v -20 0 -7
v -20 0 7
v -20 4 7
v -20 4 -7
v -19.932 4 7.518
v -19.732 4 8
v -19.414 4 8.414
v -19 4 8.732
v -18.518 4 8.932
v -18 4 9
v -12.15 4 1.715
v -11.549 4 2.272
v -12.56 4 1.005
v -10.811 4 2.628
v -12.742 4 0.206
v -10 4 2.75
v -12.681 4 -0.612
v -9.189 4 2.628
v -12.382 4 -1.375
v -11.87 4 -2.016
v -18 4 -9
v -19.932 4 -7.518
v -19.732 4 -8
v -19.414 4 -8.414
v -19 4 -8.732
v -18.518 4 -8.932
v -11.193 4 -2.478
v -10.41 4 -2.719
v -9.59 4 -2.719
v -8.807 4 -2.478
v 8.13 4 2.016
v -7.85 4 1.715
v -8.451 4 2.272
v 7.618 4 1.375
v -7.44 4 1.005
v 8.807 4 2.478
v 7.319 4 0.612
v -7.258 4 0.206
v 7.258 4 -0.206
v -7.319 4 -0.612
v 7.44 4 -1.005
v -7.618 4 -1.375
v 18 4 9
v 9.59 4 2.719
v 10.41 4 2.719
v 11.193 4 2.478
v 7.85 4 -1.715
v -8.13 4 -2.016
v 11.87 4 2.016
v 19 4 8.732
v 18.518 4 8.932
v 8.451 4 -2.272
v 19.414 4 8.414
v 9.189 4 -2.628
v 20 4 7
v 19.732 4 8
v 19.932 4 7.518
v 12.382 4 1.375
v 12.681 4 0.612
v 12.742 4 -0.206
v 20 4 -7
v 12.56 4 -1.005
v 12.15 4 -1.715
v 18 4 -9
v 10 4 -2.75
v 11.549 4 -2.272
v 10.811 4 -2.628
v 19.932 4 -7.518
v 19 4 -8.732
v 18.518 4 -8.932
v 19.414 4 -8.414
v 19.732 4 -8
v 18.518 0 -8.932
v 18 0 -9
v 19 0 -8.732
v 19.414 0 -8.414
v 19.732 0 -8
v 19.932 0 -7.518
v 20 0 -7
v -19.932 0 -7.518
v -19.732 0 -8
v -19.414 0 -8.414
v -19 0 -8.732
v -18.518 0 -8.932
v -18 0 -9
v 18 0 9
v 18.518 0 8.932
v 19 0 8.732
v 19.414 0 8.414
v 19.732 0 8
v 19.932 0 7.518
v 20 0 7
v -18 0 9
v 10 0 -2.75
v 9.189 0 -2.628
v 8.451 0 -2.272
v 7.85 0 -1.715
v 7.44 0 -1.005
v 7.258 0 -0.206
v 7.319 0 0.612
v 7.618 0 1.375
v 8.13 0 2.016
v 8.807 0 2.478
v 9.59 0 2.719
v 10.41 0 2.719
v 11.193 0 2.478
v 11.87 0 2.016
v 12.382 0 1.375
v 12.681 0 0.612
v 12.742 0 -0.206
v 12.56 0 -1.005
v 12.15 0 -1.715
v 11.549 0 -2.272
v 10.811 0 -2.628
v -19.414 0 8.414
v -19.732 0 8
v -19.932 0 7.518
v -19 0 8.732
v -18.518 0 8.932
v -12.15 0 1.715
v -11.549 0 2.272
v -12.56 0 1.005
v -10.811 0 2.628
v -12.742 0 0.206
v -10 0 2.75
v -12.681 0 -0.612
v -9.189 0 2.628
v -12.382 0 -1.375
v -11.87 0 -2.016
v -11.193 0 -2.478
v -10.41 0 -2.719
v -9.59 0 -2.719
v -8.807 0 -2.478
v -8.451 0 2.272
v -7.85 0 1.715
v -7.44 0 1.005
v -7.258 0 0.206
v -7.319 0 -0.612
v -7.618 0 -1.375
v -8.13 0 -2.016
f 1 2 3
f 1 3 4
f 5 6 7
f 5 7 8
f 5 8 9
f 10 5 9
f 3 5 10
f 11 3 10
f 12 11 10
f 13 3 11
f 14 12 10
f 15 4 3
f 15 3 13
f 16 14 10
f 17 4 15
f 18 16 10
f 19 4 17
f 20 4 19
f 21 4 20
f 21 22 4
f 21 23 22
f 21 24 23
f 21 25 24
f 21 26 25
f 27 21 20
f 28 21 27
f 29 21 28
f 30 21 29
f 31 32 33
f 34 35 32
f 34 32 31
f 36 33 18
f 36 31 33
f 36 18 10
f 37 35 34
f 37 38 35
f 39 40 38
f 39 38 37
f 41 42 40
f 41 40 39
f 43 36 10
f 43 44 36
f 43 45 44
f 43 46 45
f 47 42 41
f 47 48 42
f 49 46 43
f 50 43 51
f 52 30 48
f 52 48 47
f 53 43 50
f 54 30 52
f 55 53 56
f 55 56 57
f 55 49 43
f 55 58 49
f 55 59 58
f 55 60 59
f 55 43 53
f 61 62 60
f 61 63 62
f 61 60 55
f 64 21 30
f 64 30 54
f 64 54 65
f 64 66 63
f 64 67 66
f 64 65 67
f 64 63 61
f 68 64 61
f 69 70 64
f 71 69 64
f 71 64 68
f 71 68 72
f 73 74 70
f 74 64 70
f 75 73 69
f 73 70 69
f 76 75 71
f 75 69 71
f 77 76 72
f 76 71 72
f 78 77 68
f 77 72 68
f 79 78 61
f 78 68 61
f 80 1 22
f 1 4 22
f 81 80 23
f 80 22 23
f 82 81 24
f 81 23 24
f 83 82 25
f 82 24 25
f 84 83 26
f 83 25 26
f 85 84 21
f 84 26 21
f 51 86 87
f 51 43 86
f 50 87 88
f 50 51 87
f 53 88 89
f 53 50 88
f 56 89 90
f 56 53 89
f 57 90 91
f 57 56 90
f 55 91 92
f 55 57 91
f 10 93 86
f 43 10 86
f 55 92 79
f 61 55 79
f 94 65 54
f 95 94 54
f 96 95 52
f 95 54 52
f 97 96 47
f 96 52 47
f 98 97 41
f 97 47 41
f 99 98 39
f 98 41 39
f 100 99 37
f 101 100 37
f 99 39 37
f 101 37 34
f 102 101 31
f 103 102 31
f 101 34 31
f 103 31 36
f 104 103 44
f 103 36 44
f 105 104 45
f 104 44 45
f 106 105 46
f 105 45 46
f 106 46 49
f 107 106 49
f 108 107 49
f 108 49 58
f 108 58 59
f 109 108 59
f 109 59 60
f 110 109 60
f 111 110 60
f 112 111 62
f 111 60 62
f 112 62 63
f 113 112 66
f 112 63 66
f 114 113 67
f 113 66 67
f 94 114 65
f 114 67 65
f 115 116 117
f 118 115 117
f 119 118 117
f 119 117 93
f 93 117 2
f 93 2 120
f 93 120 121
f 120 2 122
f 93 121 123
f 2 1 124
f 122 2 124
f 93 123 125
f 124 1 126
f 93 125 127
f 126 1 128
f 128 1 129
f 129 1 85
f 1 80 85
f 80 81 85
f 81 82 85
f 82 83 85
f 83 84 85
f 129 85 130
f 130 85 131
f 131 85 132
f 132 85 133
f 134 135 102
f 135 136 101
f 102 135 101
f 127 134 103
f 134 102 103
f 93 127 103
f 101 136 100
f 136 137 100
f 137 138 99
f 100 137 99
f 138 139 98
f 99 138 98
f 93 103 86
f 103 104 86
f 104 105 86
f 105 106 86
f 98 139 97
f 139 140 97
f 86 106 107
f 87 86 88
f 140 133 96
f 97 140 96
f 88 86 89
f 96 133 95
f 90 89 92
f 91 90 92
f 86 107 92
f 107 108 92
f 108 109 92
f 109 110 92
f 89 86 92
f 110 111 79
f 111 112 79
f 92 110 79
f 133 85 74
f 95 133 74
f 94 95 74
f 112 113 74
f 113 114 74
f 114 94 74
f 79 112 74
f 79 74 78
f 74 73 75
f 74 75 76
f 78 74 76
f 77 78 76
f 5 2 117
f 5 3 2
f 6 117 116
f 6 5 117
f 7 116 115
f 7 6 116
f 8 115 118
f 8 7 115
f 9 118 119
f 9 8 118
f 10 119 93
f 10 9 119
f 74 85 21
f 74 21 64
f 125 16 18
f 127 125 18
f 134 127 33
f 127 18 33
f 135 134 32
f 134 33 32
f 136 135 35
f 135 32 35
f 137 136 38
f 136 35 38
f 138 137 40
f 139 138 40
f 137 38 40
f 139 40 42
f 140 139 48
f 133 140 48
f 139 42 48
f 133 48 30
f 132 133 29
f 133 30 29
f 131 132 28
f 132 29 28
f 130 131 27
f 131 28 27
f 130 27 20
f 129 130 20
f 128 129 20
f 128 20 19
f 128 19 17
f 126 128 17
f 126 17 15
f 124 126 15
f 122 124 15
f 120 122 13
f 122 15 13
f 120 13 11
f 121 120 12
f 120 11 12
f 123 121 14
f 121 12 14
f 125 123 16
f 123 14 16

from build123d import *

# Parameters (mm, degrees)
SKETCH_1_W          = 40
SKETCH_1_H          = 18
EXTRUDE_1_DEPTH     = 4
SKETCH_2_R          = 2.75
CUT_EXTRUDE_1_DEPTH = 4
FILLET_1_R          = 2


with BuildPart() as part:
    # 草图1 → 凸台-拉伸1 (new body)
    with BuildSketch(Plane(origin=(0, 0, 0), x_dir=(1, 0, 0), z_dir=(0, 1, 0))):
        Rectangle(SKETCH_1_W, SKETCH_1_H)
    extrude(amount=EXTRUDE_1_DEPTH)

    # 草图2 → 切除-拉伸1 (cut)
    with BuildSketch(Plane(origin=(0, 4, 0), x_dir=(1, 0, 0), z_dir=(0, 1, 0))):
        with Locations(Location((-10, 0, 0), (0, 0, 270))):
            Circle(SKETCH_2_R)
        with Locations(Location((10, 0, 0), (0, 0, 90))):
            Circle(SKETCH_2_R)
    extrude(amount=-CUT_EXTRUDE_1_DEPTH, mode=Mode.SUBTRACT)

    # 圆角1
    fillet_1_edges = [part.edges().sort_by_distance(p)[0] for p in [
        (20, 2, 9),
        (-20, 2, 9),
        (-20, 2, -9),
        (20, 2, -9),
    ]]
    fillet(fillet_1_edges, radius=FILLET_1_R)


solid = part.part
